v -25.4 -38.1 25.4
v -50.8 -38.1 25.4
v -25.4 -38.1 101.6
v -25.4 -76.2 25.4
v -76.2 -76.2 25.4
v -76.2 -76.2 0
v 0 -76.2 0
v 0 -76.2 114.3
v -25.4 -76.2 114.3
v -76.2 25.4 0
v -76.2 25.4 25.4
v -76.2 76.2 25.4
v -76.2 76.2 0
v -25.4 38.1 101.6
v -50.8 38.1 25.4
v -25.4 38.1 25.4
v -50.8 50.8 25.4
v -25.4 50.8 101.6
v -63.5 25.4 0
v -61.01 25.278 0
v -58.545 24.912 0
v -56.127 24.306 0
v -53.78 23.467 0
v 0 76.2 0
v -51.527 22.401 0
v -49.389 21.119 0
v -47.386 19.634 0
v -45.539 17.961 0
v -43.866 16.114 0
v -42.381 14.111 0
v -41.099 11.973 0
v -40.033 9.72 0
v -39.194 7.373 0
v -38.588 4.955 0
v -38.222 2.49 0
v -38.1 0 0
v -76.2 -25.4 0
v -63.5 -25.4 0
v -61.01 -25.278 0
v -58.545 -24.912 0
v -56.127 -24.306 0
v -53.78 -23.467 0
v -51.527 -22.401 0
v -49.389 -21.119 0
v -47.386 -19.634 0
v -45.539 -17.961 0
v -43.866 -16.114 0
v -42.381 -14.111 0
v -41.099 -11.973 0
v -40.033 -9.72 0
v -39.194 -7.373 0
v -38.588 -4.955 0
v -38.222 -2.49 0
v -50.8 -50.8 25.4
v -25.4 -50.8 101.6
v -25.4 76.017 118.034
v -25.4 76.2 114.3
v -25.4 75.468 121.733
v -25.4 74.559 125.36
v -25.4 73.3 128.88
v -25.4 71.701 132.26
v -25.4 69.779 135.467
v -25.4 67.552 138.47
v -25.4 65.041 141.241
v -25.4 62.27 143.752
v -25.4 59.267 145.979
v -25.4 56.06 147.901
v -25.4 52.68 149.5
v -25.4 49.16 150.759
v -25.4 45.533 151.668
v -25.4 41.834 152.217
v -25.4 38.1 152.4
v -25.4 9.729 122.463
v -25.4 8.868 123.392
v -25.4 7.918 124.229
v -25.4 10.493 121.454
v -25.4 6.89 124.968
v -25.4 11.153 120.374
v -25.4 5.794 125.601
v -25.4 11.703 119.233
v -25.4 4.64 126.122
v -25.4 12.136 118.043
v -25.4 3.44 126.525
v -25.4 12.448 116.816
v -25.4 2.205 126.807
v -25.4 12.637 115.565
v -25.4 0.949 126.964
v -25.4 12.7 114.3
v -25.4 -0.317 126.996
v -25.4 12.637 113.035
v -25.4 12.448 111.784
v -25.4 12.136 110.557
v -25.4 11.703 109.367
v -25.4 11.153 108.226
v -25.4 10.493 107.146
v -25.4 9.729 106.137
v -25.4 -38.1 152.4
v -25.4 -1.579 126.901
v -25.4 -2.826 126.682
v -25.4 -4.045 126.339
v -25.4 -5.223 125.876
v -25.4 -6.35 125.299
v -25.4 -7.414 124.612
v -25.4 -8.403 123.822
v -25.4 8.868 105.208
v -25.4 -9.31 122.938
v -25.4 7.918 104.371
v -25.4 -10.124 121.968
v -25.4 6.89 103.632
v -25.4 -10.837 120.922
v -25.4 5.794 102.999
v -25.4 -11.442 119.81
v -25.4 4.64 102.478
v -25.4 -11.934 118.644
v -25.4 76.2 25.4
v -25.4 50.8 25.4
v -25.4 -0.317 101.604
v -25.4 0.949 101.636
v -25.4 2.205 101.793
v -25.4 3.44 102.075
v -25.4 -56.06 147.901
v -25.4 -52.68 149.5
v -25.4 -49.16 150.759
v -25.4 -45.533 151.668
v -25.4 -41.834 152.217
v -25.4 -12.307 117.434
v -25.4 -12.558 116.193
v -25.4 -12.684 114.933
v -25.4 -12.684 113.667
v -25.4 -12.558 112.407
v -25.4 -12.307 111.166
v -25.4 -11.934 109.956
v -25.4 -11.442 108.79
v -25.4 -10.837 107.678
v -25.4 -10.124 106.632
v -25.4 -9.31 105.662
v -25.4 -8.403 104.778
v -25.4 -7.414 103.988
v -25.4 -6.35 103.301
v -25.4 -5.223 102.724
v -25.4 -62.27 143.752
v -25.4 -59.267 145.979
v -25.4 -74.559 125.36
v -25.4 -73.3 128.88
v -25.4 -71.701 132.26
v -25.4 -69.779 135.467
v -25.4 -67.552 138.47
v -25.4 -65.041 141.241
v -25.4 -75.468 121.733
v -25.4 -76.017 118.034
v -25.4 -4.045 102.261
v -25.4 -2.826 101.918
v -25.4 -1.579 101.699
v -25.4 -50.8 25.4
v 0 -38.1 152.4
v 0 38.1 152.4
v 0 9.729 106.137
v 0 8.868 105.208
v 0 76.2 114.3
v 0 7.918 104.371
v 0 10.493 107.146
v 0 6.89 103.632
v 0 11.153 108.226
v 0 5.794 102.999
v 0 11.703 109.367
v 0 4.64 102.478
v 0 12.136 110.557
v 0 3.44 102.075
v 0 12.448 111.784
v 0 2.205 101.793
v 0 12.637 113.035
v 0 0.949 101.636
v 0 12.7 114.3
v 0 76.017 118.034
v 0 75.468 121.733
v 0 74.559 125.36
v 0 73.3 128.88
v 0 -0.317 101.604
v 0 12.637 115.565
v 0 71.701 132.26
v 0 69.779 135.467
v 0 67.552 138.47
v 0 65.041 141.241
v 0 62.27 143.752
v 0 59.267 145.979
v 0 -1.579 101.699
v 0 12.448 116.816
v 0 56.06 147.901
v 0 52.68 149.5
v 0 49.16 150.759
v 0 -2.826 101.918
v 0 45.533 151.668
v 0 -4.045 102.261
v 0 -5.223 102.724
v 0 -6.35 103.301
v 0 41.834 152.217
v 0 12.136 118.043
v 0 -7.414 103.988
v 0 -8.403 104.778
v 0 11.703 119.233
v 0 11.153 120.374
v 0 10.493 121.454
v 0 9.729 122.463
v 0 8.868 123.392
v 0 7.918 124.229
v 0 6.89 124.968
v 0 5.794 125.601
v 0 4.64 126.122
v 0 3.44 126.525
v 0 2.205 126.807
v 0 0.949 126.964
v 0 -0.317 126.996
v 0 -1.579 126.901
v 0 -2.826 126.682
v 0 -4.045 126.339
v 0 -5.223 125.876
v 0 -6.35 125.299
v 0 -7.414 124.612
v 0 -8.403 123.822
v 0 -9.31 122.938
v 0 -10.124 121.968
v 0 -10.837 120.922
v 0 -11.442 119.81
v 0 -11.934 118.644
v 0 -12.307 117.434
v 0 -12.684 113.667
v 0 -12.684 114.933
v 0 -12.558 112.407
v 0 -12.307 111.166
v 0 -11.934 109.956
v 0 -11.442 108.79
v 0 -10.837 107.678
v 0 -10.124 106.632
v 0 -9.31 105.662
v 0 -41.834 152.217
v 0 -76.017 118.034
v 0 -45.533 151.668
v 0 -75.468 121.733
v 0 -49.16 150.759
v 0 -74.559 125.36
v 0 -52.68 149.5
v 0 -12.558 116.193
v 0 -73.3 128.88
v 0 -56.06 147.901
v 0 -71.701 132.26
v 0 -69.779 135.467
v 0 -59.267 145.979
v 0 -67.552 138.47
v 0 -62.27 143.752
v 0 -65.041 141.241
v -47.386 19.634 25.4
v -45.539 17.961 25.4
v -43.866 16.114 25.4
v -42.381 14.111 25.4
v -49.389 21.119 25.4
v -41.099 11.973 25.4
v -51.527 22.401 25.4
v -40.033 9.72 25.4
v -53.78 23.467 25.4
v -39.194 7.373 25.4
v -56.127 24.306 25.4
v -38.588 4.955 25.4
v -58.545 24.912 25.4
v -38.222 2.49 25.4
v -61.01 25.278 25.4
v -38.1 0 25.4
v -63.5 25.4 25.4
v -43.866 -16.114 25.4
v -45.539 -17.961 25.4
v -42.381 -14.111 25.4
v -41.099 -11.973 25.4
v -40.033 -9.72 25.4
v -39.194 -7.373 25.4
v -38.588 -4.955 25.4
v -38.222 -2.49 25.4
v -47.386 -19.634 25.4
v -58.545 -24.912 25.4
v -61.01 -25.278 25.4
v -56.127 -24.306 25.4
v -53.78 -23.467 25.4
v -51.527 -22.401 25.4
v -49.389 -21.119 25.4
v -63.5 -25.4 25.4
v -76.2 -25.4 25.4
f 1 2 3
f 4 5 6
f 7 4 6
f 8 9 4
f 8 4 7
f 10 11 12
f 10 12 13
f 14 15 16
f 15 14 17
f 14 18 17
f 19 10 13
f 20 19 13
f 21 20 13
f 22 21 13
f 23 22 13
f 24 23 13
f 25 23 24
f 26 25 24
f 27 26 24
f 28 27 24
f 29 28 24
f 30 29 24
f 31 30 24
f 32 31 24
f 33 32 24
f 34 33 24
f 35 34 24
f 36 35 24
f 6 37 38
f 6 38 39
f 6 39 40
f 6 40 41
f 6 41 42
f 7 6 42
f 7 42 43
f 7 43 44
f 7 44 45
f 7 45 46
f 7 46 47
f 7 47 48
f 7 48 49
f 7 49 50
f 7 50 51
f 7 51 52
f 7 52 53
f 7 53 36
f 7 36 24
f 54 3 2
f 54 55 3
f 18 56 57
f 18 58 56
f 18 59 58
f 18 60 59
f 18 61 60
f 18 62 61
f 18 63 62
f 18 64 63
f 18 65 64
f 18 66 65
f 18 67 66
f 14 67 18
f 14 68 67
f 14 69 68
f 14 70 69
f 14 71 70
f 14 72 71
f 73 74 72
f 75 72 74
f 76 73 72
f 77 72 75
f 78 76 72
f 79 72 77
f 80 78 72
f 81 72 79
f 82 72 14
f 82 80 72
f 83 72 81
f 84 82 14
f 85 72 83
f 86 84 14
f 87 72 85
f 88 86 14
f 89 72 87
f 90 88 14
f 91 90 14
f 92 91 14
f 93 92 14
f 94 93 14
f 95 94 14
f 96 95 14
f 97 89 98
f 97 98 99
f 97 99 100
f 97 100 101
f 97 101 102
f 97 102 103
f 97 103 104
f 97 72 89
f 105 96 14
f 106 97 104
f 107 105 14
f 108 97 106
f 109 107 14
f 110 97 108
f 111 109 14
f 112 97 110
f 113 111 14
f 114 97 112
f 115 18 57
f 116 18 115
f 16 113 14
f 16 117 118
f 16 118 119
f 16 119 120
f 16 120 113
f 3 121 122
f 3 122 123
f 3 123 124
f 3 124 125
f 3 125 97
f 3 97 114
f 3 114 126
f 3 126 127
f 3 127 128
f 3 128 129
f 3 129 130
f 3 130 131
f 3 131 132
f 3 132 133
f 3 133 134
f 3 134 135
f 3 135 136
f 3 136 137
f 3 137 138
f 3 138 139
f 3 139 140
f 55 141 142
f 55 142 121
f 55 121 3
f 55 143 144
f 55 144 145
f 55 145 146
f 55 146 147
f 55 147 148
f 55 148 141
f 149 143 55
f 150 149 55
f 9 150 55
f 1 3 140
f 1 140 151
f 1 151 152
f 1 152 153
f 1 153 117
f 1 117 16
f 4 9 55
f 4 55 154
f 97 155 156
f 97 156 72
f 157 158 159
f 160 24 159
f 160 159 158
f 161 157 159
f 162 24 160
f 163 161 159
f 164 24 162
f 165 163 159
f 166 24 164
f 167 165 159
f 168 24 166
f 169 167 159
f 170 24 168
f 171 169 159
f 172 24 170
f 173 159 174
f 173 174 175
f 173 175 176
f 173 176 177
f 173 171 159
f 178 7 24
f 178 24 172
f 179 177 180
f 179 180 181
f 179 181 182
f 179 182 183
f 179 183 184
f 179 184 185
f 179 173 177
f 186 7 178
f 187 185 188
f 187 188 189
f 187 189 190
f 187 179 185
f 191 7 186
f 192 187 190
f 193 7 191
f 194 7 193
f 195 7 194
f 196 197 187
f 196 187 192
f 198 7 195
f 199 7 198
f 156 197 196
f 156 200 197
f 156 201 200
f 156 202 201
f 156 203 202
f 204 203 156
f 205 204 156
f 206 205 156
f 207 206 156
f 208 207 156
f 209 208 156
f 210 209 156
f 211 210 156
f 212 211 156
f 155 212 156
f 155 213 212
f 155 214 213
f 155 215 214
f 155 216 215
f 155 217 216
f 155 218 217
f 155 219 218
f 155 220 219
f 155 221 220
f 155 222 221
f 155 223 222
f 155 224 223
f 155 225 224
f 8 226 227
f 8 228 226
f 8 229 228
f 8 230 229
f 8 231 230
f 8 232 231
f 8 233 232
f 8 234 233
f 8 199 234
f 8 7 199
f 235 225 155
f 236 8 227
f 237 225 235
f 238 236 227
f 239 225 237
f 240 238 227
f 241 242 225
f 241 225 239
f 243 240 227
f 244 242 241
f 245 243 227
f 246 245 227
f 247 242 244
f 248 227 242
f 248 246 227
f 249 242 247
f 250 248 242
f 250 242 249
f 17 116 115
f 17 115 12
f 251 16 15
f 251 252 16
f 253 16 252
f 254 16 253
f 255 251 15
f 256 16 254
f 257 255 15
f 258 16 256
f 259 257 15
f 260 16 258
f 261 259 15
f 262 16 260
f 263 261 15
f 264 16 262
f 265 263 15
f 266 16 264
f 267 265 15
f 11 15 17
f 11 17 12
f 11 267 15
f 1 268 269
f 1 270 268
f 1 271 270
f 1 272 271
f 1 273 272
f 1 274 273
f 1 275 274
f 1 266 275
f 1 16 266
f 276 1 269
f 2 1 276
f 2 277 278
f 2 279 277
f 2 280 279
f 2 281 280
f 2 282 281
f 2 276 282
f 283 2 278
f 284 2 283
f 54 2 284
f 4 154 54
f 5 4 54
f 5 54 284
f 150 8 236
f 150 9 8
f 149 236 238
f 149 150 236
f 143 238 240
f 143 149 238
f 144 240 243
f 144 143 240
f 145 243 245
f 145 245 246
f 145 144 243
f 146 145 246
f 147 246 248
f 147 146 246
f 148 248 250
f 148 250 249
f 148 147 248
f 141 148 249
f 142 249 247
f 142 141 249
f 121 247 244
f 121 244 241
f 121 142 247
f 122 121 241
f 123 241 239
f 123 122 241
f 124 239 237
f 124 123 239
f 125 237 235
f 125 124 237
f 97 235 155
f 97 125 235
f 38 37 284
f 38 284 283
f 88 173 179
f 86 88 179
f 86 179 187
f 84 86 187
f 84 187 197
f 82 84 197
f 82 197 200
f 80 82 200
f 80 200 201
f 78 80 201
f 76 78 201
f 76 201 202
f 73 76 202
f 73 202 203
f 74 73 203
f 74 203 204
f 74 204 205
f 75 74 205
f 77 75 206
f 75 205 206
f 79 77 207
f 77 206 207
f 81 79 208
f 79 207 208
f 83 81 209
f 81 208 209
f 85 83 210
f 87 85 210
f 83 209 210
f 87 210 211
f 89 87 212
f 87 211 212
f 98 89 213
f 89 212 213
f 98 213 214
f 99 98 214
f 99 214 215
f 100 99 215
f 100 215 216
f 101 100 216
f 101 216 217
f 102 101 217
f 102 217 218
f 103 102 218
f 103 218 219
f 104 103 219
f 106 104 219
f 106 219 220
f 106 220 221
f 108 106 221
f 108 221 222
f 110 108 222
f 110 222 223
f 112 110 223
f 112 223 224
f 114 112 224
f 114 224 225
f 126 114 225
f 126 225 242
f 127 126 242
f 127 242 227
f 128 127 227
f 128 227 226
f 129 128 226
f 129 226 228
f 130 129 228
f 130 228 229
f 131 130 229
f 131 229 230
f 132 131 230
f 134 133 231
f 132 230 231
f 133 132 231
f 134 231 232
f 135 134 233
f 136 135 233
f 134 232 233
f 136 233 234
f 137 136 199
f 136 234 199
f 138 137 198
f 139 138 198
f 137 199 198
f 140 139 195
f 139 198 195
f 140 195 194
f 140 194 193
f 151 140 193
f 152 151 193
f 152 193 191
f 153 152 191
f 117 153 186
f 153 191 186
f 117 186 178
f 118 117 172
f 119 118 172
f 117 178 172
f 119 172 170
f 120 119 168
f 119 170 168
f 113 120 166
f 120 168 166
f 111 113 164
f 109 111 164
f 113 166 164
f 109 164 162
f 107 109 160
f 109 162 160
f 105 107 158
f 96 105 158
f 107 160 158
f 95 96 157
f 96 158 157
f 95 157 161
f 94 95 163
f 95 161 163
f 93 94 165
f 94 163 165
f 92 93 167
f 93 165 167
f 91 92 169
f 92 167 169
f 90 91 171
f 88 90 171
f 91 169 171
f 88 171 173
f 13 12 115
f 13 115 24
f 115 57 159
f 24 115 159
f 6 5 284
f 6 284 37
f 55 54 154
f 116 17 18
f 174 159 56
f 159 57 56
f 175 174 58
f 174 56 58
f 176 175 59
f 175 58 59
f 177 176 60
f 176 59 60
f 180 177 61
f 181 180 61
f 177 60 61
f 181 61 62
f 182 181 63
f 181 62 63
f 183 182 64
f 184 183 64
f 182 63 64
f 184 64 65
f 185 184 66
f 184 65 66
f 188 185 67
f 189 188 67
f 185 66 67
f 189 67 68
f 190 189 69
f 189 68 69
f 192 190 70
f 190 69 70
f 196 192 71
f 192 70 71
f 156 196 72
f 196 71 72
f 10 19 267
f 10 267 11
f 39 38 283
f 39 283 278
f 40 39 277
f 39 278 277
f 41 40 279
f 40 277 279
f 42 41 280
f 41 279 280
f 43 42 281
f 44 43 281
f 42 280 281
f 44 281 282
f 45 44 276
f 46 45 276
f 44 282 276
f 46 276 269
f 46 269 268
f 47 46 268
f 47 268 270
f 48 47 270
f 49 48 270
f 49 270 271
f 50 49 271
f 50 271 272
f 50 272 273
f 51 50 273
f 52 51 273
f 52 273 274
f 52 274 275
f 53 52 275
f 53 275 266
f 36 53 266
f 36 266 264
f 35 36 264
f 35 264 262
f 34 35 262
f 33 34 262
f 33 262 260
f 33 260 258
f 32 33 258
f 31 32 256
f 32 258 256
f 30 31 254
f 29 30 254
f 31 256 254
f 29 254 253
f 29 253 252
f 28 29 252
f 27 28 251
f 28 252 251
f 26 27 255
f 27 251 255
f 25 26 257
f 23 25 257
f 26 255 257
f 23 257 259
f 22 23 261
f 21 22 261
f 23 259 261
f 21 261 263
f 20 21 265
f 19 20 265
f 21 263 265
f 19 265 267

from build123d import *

# Parameters (mm, degrees)
F1_DEPTH = 76.2
F2_R     = 12.7
F3_DEPTH = 76.201
F5_DEPTH = 25.401
F6_R     = 38.1
F9_DEPTH = 6.35


# Not quite as in the source:
# - a pattern or mirror of a feature is missing from the dataset's text; its kind, count and spacing are read off the source's solid


with BuildPart() as f1:
    # F0 (on Front) → F1 (new body, symmetric)
    with BuildSketch(Plane.XZ):
        Polygon((-76.2, 0), (0, 0), (0, 152.4), (-25.4, 152.4), (-25.4, 25.4), (-76.2, 25.4), align=None)
    extrude(amount=F1_DEPTH, both=True)

    # F2 (on Right) → F3 (cut, through all)
    with BuildSketch(Plane.YZ):
        with Locations((0, 114.3)):
            Circle(F2_R)
    extrude(amount=-F3_DEPTH, mode=Mode.SUBTRACT)

    # F4 (on face) → F5 (cut, through all)
    with BuildSketch(Plane.XY.offset(25.4)):
        with BuildLine():
            Line((-63.5, 25.4), (-76.2, 25.4))
            Line((-76.2, 25.4), (-76.2, -25.4))
            Line((-76.2, -25.4), (-63.5, -25.4))
            ThreePointArc((-63.5, -25.4), (-38.1, 0), (-63.5, 25.4))
        make_face()
    extrude(amount=-F5_DEPTH, mode=Mode.SUBTRACT)

    # F6
    f6_edges = [f1.edges().sort_by_distance(p)[0] for p in [
        (-12.7, -76.2, 152.4),
        (-12.7, 76.2, 152.4),
    ]]
    fillet(f6_edges, radius=F6_R)

    # F8 (on offset) → F9 (join, symmetric)
    with BuildSketch(Plane.XZ.offset(44.45)):
        Polygon((-50.8, 25.4), (-25.4, 25.4), (-25.4, 101.6), align=None)
    f9 = extrude(amount=F9_DEPTH, both=True)

    # F9_copies: F9 across plane
    add(f9.mirror(Plane.ZX))


solid = f1.part
